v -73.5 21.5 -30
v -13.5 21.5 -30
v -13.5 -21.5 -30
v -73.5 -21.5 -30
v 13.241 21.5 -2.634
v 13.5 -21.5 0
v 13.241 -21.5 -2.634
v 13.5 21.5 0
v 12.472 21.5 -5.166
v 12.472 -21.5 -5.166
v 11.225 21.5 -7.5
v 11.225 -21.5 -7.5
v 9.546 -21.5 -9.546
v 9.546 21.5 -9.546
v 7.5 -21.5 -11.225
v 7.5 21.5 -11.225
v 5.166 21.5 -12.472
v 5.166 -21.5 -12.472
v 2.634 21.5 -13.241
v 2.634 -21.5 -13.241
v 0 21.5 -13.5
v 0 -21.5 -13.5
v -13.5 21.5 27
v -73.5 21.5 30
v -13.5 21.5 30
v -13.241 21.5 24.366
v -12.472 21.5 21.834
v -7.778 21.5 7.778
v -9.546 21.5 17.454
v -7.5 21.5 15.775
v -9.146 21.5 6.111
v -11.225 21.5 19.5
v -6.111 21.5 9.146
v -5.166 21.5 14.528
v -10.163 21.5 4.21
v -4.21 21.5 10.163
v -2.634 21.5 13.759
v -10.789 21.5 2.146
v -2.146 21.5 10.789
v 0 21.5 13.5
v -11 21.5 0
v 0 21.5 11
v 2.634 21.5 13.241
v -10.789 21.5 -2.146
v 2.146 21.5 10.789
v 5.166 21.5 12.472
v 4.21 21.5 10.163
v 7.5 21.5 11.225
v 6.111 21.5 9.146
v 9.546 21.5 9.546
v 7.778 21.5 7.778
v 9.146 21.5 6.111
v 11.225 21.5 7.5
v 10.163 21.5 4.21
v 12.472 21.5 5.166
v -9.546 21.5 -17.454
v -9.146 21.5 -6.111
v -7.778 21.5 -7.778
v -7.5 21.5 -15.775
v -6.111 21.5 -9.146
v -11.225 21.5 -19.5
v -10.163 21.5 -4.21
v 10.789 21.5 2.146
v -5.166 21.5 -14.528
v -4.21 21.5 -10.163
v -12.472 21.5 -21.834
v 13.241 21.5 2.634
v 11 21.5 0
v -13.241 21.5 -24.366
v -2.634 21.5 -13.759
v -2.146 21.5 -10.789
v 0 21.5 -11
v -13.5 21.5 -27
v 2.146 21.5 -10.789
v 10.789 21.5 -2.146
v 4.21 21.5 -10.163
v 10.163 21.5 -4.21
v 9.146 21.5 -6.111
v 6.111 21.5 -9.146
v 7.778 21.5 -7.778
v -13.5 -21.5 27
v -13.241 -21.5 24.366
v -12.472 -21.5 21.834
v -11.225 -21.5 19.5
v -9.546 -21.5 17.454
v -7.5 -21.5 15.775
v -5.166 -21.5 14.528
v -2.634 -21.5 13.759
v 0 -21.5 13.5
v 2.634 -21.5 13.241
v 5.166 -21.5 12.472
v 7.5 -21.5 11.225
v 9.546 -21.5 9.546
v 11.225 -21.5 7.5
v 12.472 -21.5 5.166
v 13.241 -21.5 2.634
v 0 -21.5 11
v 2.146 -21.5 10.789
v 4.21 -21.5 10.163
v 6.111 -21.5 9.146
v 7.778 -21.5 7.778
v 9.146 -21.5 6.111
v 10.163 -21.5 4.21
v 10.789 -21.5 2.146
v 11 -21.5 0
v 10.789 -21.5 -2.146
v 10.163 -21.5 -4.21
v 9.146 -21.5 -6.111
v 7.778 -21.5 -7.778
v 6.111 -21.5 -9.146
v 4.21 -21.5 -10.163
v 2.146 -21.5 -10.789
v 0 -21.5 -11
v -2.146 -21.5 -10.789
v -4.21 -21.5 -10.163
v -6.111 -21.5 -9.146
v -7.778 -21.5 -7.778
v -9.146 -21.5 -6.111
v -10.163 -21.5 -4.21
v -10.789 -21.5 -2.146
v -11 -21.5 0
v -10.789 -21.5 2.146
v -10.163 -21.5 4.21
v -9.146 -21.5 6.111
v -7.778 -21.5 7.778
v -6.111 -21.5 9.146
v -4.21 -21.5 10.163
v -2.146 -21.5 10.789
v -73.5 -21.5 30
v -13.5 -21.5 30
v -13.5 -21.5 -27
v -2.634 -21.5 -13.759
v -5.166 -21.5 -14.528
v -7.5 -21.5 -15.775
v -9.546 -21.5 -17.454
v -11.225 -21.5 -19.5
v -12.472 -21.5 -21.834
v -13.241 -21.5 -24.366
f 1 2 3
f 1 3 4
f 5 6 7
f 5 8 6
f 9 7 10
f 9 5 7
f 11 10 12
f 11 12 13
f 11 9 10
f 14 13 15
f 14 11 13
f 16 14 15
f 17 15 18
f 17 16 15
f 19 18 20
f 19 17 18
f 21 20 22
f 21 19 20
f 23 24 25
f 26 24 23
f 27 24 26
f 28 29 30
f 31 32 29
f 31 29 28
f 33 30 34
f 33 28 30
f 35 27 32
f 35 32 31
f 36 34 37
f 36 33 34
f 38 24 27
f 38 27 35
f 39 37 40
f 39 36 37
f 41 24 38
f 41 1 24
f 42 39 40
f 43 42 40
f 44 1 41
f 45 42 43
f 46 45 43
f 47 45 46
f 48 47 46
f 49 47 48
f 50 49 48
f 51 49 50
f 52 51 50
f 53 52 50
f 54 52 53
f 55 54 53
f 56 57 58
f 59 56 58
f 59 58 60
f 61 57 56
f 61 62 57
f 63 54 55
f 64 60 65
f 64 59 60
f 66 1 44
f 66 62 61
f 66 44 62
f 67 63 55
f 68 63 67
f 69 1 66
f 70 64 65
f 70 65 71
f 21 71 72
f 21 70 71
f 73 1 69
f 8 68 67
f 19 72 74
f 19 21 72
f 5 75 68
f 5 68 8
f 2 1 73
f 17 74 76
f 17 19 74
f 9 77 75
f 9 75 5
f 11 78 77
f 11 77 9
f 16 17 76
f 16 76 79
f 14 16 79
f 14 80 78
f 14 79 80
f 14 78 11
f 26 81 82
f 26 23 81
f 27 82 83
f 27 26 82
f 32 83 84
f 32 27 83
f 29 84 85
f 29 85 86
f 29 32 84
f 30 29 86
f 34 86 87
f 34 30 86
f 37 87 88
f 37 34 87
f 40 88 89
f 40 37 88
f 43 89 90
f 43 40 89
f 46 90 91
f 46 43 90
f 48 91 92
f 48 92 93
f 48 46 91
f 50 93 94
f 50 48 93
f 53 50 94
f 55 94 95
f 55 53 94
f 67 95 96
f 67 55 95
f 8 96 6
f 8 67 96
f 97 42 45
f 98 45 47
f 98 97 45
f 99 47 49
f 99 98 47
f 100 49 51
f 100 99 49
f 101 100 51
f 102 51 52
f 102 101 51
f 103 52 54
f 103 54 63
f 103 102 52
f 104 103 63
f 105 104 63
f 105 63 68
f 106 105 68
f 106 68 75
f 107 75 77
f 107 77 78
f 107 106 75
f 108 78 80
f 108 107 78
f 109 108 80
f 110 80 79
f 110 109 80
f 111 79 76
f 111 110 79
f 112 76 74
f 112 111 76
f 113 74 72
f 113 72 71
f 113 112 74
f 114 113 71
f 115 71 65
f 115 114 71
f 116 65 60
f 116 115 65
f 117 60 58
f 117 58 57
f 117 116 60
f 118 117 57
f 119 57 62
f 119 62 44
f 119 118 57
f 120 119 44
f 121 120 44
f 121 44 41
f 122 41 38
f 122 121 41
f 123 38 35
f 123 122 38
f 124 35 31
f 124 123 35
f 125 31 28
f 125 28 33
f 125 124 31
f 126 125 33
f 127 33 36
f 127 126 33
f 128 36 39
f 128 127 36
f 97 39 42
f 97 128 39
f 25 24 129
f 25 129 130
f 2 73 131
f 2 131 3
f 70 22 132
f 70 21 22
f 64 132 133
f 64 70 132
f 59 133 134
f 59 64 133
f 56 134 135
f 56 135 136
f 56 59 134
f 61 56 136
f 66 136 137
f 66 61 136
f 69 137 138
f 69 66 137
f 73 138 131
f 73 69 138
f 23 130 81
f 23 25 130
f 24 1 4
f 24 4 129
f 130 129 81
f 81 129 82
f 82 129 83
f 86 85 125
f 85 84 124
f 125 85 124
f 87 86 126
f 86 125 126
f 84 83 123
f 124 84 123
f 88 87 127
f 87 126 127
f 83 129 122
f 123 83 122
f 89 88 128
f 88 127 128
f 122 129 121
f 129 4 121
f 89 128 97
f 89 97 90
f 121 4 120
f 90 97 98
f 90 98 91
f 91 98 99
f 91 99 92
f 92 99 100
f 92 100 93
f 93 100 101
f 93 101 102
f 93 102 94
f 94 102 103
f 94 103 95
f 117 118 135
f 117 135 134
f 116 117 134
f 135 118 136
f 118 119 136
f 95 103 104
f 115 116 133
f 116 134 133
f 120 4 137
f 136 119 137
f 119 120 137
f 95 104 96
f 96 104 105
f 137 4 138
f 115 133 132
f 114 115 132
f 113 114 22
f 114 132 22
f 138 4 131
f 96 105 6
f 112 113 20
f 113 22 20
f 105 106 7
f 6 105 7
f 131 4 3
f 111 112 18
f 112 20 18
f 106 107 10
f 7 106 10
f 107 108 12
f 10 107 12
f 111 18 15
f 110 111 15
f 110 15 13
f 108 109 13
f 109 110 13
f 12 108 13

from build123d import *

# Parameters (mm, degrees)
SKETCH_1_R      = 11
EXTRUDE_1_DEPTH = 21.5


with BuildPart() as part:
    # Эскиз1 → Бобышка-Вытянуть1 (new, symmetric)
    with BuildSketch(Plane(origin=(0, 0, 0), x_dir=(1, 0, 0), z_dir=(0, 1, 0))):
        with BuildLine():
            ThreePointArc((0, 13.5), (-9.545941546, 17.454058454), (-13.5, 27))
            Line((-13.5, 27), (-13.5, 30))
            Line((-13.5, 30), (-73.5, 30))
            Line((-73.5, 30), (-73.5, -30))
            Line((-73.5, -30), (-13.5, -30))
            Line((-13.5, -30), (-13.5, -27))
            ThreePointArc((-13.5, -27), (-9.545941546, -17.454058454), (0, -13.5))
            ThreePointArc((0, -13.5), (9.545941546, -9.545941546), (13.5, 0))
            ThreePointArc((13.5, 0), (9.545941546, 9.545941546), (0, 13.5))
        make_face()
        with Locations(Location((0, 0, 0), (0, 0, 270))):
            Circle(SKETCH_1_R, mode=Mode.SUBTRACT)
    extrude(amount=EXTRUDE_1_DEPTH, both=True)


solid = part.part
